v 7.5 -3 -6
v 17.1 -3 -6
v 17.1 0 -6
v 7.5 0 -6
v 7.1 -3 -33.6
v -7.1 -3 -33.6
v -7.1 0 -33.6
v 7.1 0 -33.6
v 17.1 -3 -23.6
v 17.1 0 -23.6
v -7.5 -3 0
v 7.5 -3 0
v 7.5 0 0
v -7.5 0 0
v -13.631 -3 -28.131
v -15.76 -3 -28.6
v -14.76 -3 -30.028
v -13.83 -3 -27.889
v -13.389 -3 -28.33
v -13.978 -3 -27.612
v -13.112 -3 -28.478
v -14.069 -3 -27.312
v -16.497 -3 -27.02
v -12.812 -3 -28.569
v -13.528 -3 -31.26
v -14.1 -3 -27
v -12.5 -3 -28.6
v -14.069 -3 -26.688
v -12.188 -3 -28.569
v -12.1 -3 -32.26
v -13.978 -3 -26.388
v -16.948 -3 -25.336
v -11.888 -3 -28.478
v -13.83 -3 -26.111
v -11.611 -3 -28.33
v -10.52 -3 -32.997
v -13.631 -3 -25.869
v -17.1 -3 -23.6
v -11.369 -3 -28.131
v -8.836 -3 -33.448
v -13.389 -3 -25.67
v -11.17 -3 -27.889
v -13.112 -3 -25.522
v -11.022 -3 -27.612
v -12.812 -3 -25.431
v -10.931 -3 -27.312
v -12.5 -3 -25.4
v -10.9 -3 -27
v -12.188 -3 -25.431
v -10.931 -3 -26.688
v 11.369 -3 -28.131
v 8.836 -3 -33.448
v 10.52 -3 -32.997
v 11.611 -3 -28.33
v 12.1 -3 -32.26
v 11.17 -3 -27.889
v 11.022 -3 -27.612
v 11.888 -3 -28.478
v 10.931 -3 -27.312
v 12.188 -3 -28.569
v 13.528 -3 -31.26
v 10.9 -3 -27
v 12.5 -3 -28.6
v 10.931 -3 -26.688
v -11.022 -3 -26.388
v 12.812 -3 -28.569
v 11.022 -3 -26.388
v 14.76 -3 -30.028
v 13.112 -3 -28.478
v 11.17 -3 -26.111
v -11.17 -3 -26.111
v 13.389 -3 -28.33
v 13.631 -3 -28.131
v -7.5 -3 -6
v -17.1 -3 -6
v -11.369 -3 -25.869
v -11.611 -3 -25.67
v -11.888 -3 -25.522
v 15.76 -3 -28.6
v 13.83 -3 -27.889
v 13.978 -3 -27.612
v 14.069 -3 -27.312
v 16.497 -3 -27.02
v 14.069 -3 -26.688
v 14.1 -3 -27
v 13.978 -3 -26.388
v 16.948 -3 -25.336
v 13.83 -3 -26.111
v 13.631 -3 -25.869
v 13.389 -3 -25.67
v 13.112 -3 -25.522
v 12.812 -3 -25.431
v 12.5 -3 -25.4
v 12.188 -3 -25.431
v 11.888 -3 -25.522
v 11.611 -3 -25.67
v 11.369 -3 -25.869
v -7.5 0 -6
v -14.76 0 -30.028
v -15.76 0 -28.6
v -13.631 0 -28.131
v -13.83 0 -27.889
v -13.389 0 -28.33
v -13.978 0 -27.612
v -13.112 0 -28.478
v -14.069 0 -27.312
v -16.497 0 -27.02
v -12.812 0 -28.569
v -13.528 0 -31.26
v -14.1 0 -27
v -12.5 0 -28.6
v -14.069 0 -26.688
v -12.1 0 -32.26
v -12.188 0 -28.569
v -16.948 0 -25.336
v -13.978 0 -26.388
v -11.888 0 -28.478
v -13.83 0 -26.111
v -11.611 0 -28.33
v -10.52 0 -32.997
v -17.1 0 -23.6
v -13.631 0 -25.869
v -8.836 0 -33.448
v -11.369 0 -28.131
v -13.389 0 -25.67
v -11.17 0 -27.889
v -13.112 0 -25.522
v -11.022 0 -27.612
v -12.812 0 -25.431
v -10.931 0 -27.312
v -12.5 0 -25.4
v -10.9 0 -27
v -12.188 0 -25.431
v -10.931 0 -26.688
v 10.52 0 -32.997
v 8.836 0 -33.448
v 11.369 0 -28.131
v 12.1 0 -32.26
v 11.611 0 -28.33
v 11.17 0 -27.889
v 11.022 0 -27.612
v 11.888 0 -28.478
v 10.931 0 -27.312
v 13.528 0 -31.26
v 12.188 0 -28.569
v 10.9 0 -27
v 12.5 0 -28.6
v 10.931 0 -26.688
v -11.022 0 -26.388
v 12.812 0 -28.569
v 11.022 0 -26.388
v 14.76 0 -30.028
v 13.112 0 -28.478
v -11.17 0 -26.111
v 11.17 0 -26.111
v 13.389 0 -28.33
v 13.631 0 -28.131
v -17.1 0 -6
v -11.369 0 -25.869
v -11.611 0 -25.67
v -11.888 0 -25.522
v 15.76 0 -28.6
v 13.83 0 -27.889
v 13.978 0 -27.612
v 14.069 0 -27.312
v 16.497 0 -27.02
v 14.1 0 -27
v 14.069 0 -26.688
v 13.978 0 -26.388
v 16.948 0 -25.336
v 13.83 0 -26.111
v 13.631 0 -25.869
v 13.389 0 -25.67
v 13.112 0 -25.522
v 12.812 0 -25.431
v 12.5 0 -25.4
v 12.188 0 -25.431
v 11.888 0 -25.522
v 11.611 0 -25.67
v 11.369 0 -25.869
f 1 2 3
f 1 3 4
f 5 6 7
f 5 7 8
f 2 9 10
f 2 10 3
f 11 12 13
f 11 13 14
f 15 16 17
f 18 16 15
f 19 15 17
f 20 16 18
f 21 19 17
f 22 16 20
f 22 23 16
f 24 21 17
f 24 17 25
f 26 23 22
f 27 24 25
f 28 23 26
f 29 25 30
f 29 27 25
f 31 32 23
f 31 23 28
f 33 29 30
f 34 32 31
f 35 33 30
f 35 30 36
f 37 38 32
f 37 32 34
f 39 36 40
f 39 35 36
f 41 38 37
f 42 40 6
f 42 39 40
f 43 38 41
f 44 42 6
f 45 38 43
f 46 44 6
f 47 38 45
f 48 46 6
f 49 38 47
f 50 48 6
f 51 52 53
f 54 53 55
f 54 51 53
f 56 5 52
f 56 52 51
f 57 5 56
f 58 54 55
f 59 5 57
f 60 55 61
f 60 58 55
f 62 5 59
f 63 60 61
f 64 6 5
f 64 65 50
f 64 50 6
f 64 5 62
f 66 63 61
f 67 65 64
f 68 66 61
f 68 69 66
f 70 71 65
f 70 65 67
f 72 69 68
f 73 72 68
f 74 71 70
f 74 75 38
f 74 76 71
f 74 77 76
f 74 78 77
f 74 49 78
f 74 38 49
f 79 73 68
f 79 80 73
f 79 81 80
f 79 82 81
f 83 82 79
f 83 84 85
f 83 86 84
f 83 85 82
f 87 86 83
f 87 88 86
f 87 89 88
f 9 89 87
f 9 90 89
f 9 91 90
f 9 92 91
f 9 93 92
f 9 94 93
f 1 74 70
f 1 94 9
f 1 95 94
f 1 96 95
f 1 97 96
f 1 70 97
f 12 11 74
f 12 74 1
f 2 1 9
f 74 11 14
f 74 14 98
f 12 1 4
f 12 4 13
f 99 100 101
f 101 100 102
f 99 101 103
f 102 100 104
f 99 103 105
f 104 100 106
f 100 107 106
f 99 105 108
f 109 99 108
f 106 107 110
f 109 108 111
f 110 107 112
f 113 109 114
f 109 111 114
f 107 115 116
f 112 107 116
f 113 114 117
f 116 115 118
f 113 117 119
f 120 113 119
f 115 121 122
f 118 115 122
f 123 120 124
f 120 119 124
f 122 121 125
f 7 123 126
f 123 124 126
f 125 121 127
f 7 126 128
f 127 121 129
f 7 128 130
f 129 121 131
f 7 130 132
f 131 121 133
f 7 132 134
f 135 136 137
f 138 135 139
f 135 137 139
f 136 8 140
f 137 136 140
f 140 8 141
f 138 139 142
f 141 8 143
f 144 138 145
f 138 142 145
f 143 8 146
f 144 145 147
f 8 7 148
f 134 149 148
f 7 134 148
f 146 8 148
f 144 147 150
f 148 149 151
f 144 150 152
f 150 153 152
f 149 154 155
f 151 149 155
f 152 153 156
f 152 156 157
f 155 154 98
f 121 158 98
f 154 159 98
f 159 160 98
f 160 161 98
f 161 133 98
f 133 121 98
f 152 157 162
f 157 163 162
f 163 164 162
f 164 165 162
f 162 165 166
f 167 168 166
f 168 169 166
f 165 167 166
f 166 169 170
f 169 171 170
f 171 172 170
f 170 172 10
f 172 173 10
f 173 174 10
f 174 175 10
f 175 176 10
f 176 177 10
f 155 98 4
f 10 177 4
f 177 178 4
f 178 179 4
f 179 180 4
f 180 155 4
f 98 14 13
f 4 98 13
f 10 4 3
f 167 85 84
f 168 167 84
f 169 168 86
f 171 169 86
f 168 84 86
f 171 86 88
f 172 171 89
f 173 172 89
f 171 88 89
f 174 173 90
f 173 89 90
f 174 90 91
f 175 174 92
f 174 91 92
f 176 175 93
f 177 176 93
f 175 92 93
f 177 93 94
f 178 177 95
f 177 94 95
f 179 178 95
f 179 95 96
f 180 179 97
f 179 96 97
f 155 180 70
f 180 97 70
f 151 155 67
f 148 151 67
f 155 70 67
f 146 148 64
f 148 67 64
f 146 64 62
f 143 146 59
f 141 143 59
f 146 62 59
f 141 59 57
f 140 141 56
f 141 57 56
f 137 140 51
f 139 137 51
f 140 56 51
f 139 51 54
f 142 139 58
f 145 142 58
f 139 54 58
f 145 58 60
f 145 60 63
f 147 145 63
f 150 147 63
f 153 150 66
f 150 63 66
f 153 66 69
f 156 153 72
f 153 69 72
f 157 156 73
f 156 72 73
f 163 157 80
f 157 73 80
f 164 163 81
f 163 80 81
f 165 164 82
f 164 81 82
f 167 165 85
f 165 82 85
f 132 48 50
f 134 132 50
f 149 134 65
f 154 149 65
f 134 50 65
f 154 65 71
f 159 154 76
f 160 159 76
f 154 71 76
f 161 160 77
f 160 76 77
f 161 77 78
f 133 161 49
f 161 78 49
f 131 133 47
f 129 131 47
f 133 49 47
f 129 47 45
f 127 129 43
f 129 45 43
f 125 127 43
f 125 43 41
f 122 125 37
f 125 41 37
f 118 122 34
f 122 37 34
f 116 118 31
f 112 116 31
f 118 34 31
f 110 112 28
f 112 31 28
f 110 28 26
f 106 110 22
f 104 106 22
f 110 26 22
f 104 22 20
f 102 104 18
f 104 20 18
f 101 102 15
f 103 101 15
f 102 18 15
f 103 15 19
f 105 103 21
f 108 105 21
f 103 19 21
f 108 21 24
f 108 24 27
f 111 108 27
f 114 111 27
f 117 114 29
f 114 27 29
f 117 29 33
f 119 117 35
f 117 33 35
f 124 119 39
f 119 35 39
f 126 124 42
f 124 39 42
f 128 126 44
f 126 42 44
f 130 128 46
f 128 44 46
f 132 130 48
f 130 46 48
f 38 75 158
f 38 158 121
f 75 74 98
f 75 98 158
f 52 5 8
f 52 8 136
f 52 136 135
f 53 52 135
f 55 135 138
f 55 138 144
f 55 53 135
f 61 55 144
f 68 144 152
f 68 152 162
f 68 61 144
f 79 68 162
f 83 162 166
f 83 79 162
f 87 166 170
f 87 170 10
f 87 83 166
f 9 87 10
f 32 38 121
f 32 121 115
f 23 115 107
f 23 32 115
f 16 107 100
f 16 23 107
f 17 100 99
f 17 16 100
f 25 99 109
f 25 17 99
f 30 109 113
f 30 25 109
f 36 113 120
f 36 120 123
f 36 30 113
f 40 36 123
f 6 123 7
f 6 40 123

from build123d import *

# Parameters (mm, degrees)
ESBO_O1_R                = 1.6
RESSALTO_EXTRUS_O1_DEPTH = 3


with BuildPart() as part:
    # Esboço1 → Ressalto-extrusão1 (new body)
    with BuildSketch(Plane.XZ.offset(3)):
        with BuildLine():
            Line((-7.1, -33.6), (7.1, -33.6))
            ThreePointArc((7.1, -33.6), (14.171067812, -30.671067812), (17.1, -23.6))
            Line((17.1, -23.6), (17.1, -6))
            Line((17.1, -6), (7.5, -6))
            Line((7.5, -6), (7.5, 0))
            Line((7.5, 0), (-7.5, 0))
            Line((-7.5, 0), (-7.5, -6))
            Line((-7.5, -6), (-17.1, -6))
            Line((-17.1, -6), (-17.1, -23.6))
            ThreePointArc((-17.1, -23.6), (-14.171067812, -30.671067812), (-7.1, -33.6))
        make_face()
        with Locations((-12.5, -27)):
            Circle(ESBO_O1_R, mode=Mode.SUBTRACT)
        with Locations((12.5, -27)):
            Circle(ESBO_O1_R, mode=Mode.SUBTRACT)
    extrude(amount=-RESSALTO_EXTRUS_O1_DEPTH)


solid = part.part
